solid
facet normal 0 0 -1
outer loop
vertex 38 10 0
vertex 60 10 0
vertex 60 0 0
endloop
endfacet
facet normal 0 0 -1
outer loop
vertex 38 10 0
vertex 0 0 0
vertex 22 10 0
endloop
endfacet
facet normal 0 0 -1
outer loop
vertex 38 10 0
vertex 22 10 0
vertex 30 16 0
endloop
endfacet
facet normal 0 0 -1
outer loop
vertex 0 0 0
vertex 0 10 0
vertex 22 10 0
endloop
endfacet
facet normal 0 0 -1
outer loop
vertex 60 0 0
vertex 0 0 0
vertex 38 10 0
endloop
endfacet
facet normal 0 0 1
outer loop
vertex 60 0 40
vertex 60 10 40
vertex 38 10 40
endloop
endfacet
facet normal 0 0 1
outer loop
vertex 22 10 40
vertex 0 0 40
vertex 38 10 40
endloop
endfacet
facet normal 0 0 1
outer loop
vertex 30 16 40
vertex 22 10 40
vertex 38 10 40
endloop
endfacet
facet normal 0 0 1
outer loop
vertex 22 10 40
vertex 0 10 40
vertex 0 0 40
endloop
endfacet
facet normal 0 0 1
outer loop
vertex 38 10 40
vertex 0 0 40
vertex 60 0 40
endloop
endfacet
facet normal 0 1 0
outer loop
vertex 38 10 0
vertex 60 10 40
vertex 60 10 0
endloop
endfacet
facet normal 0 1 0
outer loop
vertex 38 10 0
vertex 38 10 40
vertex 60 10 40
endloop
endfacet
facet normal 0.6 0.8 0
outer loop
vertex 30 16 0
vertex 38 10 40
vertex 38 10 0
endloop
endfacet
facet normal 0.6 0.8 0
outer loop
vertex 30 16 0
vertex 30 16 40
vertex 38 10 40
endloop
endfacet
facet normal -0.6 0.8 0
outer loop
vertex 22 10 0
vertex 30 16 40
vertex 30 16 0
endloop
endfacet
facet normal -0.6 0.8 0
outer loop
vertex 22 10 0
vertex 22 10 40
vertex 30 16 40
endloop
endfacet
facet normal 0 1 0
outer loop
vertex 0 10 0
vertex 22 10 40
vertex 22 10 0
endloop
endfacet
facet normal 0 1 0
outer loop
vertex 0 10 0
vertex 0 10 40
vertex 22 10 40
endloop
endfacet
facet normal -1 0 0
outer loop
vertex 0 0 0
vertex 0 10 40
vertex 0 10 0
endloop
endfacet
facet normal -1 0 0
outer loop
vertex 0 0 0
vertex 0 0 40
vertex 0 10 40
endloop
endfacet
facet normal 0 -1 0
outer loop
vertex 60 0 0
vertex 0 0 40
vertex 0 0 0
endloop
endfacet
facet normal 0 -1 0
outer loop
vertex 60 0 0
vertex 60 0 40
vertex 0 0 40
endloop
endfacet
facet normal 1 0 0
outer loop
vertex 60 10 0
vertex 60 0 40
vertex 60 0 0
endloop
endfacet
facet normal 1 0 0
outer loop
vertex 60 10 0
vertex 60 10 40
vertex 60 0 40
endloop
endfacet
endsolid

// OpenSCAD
$fn = 32;

// ----------------------------------------------------------------------
// V guide rail: vrib, 60 mm wide
// ----------------------------------------------------------------------

// --- parameters (mm) ---
rail_w = 60;              // rail width, X
base_t = 10;              // base plate thickness
v_depth = 6;              // V feature depth / height
v_half_w = 8;             // half width of the V at the base face
plate_t = 40;             // rail length, Z (the extrusion height)

profile = [[0, 0], [60, 0], [60, 10], [38, 10], [30, 16], [22, 10], [0, 10]];  // primary outline, 7 points, counter clockwise

// --- the one profile operation ---
linear_extrude(height = plate_t) polygon(points = profile);
